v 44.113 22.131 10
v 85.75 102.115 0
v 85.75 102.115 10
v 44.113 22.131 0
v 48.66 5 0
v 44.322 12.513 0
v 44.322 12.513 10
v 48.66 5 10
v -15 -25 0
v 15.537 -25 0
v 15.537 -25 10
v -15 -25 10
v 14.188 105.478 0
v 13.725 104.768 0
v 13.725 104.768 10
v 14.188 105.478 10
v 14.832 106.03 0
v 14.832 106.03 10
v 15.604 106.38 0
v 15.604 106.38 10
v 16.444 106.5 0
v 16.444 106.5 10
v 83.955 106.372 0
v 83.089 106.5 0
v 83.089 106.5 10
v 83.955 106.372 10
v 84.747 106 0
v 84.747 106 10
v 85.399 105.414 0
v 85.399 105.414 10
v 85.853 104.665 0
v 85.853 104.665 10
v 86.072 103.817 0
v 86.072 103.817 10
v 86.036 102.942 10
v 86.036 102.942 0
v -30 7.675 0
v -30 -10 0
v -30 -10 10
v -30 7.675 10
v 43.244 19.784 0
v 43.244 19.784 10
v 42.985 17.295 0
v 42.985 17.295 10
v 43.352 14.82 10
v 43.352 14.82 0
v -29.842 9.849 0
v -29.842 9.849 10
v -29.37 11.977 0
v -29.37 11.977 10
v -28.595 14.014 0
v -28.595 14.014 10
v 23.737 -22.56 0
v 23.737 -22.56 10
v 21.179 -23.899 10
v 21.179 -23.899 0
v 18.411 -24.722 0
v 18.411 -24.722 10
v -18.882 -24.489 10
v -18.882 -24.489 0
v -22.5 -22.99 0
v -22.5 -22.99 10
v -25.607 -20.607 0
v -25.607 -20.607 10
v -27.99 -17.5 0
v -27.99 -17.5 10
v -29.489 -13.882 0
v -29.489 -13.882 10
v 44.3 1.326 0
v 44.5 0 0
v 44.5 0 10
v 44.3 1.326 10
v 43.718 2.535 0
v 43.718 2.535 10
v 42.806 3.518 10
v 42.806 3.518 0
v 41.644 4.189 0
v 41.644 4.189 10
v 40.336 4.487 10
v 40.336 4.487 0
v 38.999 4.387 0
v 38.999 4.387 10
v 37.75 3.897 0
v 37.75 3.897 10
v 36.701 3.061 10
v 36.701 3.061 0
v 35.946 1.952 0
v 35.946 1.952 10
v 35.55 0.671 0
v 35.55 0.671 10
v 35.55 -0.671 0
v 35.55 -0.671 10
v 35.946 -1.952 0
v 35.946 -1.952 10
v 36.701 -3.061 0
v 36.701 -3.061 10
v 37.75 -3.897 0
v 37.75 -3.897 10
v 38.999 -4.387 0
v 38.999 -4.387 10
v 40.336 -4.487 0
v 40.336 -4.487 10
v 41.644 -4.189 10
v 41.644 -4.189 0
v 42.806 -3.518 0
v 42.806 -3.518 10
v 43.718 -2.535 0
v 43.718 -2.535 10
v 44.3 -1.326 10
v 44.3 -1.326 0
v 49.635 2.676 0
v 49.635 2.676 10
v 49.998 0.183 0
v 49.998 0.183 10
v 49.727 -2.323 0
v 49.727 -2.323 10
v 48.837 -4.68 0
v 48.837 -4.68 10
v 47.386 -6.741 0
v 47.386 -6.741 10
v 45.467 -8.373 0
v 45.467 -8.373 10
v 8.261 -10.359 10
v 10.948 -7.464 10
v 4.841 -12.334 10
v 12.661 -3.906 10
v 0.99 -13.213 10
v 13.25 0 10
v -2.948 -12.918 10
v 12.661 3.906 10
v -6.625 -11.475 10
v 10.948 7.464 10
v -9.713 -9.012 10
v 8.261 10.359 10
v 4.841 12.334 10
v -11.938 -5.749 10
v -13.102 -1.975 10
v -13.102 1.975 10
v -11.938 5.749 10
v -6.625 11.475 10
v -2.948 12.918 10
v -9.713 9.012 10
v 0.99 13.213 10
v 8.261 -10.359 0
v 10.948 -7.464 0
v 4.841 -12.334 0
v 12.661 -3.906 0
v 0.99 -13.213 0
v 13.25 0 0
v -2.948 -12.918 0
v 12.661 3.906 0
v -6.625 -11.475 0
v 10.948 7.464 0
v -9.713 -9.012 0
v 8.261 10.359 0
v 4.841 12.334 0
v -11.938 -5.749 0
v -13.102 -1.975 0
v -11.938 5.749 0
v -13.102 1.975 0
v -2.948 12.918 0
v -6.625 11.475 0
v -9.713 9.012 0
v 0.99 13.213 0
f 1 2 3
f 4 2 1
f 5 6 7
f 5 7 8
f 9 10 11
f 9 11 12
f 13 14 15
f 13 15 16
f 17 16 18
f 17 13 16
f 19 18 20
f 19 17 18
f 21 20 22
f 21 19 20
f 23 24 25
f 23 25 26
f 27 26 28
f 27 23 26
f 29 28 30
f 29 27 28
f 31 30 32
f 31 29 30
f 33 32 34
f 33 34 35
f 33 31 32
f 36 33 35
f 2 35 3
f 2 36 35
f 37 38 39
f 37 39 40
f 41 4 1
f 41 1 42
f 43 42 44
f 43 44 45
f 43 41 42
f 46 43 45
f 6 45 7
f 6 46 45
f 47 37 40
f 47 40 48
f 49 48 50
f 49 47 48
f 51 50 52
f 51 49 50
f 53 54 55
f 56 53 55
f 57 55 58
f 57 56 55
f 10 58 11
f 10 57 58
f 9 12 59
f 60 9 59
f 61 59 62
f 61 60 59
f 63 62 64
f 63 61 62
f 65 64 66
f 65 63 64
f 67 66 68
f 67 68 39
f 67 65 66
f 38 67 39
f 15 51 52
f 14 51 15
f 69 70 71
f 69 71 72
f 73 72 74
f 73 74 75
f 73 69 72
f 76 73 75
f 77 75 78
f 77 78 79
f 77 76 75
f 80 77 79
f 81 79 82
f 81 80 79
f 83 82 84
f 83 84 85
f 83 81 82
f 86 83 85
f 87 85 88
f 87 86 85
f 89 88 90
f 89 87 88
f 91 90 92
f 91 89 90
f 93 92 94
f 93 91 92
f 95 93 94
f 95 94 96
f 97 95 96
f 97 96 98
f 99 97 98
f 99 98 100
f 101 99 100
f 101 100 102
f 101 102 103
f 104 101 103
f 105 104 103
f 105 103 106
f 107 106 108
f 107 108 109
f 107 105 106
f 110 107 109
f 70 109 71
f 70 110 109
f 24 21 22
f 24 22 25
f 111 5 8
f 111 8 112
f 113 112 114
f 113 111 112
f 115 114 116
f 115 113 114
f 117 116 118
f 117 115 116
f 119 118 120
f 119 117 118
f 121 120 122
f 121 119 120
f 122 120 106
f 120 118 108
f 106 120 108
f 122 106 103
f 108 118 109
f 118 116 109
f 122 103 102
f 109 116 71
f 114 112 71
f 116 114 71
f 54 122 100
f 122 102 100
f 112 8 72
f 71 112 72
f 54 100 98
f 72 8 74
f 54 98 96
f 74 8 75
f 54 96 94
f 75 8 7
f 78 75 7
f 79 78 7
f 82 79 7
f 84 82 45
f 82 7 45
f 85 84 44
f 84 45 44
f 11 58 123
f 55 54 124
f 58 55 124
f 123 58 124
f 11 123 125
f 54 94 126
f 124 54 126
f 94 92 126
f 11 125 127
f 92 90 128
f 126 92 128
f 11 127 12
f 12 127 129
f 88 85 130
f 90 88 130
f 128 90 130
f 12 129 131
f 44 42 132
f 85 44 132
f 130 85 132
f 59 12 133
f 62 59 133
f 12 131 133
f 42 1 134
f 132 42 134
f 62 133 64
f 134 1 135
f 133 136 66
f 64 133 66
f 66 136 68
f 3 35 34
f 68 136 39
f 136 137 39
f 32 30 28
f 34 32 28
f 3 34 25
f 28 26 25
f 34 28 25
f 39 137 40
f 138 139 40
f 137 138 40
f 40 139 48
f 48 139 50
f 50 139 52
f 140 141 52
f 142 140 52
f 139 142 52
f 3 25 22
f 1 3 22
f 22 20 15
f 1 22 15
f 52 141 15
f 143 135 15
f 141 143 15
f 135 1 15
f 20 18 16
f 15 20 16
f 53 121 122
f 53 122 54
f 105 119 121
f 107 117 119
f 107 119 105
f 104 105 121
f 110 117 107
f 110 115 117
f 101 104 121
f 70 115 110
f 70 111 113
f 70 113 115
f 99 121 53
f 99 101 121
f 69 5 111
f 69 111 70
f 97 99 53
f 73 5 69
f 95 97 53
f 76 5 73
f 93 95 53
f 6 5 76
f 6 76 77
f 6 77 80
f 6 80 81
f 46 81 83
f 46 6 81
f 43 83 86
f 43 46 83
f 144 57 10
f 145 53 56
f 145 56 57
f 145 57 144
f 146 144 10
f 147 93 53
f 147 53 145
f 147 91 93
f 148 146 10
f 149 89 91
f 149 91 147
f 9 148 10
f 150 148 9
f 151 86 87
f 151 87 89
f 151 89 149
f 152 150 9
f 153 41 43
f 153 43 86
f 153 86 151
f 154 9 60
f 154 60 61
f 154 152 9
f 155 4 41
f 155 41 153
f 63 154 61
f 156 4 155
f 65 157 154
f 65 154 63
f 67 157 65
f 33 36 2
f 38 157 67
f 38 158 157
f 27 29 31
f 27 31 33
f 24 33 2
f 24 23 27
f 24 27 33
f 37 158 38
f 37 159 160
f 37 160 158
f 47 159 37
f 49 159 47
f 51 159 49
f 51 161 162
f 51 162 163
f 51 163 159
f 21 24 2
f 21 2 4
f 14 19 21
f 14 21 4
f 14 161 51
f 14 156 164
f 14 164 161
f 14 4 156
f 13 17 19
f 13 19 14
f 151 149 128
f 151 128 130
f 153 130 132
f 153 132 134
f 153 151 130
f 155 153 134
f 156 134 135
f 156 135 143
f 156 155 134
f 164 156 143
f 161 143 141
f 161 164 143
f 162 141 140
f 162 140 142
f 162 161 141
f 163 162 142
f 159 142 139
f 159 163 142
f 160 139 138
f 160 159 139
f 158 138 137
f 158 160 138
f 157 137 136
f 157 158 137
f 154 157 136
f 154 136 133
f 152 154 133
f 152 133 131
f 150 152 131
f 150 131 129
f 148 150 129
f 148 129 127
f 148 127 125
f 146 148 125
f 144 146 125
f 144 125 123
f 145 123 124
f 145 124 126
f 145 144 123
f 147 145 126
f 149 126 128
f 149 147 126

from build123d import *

# Parameters (mm, degrees)
SKETCH1_R          = 13.25
SKETCH1_R_2        = 4.5
BASE_EXTRUDE_DEPTH = 10


with BuildPart() as part:
    # Sketch1 → Base-Extrude (new body)
    with BuildSketch(Plane.XY):
        with BuildLine():
            Line((45.466783574, -8.373426859), (23.737112795, -22.560140288))
            ThreePointArc((23.737112795, -22.560140288), (19.814664383, -24.377101661), (15.536937435, -25))
            Line((15.536937435, -25), (-15, -25))
            ThreePointArc((-15, -25), (-25.606601718, -20.606601718), (-30, -10))
            Line((-30, -10), (-30, 7.67458006))
            ThreePointArc((-30, 7.67458006), (-29.644440107, 10.921174269), (-28.594616806, 14.013853986))
            Line((-28.594616806, 14.013853986), (13.724668775, 104.767854785))
            ThreePointArc((13.724668775, 104.767854785), (14.831693311, 106.030174337), (16.443592136, 106.5))
            Line((16.443592136, 106.5), (83.088534362, 106.5))
            ThreePointArc((83.088534362, 106.5), (85.653269974, 105.056319774), (85.749566861, 102.11475416))
            Line((85.749566861, 102.11475416), (44.112570075, 22.130827513))
            ThreePointArc((44.112570075, 22.130827513), (42.985058136, 17.295192531), (44.322424369, 12.513341381))
            Line((44.322424369, 12.513341381), (48.660254038, 5))
            ThreePointArc((48.660254038, 5), (49.726532496, -2.322620416), (45.466783574, -8.373426859))
        make_face()
        Circle(SKETCH1_R, mode=Mode.SUBTRACT)
        with Locations((40, 0)):
            Circle(SKETCH1_R_2, mode=Mode.SUBTRACT)
    extrude(amount=BASE_EXTRUDE_DEPTH)


solid = part.part
